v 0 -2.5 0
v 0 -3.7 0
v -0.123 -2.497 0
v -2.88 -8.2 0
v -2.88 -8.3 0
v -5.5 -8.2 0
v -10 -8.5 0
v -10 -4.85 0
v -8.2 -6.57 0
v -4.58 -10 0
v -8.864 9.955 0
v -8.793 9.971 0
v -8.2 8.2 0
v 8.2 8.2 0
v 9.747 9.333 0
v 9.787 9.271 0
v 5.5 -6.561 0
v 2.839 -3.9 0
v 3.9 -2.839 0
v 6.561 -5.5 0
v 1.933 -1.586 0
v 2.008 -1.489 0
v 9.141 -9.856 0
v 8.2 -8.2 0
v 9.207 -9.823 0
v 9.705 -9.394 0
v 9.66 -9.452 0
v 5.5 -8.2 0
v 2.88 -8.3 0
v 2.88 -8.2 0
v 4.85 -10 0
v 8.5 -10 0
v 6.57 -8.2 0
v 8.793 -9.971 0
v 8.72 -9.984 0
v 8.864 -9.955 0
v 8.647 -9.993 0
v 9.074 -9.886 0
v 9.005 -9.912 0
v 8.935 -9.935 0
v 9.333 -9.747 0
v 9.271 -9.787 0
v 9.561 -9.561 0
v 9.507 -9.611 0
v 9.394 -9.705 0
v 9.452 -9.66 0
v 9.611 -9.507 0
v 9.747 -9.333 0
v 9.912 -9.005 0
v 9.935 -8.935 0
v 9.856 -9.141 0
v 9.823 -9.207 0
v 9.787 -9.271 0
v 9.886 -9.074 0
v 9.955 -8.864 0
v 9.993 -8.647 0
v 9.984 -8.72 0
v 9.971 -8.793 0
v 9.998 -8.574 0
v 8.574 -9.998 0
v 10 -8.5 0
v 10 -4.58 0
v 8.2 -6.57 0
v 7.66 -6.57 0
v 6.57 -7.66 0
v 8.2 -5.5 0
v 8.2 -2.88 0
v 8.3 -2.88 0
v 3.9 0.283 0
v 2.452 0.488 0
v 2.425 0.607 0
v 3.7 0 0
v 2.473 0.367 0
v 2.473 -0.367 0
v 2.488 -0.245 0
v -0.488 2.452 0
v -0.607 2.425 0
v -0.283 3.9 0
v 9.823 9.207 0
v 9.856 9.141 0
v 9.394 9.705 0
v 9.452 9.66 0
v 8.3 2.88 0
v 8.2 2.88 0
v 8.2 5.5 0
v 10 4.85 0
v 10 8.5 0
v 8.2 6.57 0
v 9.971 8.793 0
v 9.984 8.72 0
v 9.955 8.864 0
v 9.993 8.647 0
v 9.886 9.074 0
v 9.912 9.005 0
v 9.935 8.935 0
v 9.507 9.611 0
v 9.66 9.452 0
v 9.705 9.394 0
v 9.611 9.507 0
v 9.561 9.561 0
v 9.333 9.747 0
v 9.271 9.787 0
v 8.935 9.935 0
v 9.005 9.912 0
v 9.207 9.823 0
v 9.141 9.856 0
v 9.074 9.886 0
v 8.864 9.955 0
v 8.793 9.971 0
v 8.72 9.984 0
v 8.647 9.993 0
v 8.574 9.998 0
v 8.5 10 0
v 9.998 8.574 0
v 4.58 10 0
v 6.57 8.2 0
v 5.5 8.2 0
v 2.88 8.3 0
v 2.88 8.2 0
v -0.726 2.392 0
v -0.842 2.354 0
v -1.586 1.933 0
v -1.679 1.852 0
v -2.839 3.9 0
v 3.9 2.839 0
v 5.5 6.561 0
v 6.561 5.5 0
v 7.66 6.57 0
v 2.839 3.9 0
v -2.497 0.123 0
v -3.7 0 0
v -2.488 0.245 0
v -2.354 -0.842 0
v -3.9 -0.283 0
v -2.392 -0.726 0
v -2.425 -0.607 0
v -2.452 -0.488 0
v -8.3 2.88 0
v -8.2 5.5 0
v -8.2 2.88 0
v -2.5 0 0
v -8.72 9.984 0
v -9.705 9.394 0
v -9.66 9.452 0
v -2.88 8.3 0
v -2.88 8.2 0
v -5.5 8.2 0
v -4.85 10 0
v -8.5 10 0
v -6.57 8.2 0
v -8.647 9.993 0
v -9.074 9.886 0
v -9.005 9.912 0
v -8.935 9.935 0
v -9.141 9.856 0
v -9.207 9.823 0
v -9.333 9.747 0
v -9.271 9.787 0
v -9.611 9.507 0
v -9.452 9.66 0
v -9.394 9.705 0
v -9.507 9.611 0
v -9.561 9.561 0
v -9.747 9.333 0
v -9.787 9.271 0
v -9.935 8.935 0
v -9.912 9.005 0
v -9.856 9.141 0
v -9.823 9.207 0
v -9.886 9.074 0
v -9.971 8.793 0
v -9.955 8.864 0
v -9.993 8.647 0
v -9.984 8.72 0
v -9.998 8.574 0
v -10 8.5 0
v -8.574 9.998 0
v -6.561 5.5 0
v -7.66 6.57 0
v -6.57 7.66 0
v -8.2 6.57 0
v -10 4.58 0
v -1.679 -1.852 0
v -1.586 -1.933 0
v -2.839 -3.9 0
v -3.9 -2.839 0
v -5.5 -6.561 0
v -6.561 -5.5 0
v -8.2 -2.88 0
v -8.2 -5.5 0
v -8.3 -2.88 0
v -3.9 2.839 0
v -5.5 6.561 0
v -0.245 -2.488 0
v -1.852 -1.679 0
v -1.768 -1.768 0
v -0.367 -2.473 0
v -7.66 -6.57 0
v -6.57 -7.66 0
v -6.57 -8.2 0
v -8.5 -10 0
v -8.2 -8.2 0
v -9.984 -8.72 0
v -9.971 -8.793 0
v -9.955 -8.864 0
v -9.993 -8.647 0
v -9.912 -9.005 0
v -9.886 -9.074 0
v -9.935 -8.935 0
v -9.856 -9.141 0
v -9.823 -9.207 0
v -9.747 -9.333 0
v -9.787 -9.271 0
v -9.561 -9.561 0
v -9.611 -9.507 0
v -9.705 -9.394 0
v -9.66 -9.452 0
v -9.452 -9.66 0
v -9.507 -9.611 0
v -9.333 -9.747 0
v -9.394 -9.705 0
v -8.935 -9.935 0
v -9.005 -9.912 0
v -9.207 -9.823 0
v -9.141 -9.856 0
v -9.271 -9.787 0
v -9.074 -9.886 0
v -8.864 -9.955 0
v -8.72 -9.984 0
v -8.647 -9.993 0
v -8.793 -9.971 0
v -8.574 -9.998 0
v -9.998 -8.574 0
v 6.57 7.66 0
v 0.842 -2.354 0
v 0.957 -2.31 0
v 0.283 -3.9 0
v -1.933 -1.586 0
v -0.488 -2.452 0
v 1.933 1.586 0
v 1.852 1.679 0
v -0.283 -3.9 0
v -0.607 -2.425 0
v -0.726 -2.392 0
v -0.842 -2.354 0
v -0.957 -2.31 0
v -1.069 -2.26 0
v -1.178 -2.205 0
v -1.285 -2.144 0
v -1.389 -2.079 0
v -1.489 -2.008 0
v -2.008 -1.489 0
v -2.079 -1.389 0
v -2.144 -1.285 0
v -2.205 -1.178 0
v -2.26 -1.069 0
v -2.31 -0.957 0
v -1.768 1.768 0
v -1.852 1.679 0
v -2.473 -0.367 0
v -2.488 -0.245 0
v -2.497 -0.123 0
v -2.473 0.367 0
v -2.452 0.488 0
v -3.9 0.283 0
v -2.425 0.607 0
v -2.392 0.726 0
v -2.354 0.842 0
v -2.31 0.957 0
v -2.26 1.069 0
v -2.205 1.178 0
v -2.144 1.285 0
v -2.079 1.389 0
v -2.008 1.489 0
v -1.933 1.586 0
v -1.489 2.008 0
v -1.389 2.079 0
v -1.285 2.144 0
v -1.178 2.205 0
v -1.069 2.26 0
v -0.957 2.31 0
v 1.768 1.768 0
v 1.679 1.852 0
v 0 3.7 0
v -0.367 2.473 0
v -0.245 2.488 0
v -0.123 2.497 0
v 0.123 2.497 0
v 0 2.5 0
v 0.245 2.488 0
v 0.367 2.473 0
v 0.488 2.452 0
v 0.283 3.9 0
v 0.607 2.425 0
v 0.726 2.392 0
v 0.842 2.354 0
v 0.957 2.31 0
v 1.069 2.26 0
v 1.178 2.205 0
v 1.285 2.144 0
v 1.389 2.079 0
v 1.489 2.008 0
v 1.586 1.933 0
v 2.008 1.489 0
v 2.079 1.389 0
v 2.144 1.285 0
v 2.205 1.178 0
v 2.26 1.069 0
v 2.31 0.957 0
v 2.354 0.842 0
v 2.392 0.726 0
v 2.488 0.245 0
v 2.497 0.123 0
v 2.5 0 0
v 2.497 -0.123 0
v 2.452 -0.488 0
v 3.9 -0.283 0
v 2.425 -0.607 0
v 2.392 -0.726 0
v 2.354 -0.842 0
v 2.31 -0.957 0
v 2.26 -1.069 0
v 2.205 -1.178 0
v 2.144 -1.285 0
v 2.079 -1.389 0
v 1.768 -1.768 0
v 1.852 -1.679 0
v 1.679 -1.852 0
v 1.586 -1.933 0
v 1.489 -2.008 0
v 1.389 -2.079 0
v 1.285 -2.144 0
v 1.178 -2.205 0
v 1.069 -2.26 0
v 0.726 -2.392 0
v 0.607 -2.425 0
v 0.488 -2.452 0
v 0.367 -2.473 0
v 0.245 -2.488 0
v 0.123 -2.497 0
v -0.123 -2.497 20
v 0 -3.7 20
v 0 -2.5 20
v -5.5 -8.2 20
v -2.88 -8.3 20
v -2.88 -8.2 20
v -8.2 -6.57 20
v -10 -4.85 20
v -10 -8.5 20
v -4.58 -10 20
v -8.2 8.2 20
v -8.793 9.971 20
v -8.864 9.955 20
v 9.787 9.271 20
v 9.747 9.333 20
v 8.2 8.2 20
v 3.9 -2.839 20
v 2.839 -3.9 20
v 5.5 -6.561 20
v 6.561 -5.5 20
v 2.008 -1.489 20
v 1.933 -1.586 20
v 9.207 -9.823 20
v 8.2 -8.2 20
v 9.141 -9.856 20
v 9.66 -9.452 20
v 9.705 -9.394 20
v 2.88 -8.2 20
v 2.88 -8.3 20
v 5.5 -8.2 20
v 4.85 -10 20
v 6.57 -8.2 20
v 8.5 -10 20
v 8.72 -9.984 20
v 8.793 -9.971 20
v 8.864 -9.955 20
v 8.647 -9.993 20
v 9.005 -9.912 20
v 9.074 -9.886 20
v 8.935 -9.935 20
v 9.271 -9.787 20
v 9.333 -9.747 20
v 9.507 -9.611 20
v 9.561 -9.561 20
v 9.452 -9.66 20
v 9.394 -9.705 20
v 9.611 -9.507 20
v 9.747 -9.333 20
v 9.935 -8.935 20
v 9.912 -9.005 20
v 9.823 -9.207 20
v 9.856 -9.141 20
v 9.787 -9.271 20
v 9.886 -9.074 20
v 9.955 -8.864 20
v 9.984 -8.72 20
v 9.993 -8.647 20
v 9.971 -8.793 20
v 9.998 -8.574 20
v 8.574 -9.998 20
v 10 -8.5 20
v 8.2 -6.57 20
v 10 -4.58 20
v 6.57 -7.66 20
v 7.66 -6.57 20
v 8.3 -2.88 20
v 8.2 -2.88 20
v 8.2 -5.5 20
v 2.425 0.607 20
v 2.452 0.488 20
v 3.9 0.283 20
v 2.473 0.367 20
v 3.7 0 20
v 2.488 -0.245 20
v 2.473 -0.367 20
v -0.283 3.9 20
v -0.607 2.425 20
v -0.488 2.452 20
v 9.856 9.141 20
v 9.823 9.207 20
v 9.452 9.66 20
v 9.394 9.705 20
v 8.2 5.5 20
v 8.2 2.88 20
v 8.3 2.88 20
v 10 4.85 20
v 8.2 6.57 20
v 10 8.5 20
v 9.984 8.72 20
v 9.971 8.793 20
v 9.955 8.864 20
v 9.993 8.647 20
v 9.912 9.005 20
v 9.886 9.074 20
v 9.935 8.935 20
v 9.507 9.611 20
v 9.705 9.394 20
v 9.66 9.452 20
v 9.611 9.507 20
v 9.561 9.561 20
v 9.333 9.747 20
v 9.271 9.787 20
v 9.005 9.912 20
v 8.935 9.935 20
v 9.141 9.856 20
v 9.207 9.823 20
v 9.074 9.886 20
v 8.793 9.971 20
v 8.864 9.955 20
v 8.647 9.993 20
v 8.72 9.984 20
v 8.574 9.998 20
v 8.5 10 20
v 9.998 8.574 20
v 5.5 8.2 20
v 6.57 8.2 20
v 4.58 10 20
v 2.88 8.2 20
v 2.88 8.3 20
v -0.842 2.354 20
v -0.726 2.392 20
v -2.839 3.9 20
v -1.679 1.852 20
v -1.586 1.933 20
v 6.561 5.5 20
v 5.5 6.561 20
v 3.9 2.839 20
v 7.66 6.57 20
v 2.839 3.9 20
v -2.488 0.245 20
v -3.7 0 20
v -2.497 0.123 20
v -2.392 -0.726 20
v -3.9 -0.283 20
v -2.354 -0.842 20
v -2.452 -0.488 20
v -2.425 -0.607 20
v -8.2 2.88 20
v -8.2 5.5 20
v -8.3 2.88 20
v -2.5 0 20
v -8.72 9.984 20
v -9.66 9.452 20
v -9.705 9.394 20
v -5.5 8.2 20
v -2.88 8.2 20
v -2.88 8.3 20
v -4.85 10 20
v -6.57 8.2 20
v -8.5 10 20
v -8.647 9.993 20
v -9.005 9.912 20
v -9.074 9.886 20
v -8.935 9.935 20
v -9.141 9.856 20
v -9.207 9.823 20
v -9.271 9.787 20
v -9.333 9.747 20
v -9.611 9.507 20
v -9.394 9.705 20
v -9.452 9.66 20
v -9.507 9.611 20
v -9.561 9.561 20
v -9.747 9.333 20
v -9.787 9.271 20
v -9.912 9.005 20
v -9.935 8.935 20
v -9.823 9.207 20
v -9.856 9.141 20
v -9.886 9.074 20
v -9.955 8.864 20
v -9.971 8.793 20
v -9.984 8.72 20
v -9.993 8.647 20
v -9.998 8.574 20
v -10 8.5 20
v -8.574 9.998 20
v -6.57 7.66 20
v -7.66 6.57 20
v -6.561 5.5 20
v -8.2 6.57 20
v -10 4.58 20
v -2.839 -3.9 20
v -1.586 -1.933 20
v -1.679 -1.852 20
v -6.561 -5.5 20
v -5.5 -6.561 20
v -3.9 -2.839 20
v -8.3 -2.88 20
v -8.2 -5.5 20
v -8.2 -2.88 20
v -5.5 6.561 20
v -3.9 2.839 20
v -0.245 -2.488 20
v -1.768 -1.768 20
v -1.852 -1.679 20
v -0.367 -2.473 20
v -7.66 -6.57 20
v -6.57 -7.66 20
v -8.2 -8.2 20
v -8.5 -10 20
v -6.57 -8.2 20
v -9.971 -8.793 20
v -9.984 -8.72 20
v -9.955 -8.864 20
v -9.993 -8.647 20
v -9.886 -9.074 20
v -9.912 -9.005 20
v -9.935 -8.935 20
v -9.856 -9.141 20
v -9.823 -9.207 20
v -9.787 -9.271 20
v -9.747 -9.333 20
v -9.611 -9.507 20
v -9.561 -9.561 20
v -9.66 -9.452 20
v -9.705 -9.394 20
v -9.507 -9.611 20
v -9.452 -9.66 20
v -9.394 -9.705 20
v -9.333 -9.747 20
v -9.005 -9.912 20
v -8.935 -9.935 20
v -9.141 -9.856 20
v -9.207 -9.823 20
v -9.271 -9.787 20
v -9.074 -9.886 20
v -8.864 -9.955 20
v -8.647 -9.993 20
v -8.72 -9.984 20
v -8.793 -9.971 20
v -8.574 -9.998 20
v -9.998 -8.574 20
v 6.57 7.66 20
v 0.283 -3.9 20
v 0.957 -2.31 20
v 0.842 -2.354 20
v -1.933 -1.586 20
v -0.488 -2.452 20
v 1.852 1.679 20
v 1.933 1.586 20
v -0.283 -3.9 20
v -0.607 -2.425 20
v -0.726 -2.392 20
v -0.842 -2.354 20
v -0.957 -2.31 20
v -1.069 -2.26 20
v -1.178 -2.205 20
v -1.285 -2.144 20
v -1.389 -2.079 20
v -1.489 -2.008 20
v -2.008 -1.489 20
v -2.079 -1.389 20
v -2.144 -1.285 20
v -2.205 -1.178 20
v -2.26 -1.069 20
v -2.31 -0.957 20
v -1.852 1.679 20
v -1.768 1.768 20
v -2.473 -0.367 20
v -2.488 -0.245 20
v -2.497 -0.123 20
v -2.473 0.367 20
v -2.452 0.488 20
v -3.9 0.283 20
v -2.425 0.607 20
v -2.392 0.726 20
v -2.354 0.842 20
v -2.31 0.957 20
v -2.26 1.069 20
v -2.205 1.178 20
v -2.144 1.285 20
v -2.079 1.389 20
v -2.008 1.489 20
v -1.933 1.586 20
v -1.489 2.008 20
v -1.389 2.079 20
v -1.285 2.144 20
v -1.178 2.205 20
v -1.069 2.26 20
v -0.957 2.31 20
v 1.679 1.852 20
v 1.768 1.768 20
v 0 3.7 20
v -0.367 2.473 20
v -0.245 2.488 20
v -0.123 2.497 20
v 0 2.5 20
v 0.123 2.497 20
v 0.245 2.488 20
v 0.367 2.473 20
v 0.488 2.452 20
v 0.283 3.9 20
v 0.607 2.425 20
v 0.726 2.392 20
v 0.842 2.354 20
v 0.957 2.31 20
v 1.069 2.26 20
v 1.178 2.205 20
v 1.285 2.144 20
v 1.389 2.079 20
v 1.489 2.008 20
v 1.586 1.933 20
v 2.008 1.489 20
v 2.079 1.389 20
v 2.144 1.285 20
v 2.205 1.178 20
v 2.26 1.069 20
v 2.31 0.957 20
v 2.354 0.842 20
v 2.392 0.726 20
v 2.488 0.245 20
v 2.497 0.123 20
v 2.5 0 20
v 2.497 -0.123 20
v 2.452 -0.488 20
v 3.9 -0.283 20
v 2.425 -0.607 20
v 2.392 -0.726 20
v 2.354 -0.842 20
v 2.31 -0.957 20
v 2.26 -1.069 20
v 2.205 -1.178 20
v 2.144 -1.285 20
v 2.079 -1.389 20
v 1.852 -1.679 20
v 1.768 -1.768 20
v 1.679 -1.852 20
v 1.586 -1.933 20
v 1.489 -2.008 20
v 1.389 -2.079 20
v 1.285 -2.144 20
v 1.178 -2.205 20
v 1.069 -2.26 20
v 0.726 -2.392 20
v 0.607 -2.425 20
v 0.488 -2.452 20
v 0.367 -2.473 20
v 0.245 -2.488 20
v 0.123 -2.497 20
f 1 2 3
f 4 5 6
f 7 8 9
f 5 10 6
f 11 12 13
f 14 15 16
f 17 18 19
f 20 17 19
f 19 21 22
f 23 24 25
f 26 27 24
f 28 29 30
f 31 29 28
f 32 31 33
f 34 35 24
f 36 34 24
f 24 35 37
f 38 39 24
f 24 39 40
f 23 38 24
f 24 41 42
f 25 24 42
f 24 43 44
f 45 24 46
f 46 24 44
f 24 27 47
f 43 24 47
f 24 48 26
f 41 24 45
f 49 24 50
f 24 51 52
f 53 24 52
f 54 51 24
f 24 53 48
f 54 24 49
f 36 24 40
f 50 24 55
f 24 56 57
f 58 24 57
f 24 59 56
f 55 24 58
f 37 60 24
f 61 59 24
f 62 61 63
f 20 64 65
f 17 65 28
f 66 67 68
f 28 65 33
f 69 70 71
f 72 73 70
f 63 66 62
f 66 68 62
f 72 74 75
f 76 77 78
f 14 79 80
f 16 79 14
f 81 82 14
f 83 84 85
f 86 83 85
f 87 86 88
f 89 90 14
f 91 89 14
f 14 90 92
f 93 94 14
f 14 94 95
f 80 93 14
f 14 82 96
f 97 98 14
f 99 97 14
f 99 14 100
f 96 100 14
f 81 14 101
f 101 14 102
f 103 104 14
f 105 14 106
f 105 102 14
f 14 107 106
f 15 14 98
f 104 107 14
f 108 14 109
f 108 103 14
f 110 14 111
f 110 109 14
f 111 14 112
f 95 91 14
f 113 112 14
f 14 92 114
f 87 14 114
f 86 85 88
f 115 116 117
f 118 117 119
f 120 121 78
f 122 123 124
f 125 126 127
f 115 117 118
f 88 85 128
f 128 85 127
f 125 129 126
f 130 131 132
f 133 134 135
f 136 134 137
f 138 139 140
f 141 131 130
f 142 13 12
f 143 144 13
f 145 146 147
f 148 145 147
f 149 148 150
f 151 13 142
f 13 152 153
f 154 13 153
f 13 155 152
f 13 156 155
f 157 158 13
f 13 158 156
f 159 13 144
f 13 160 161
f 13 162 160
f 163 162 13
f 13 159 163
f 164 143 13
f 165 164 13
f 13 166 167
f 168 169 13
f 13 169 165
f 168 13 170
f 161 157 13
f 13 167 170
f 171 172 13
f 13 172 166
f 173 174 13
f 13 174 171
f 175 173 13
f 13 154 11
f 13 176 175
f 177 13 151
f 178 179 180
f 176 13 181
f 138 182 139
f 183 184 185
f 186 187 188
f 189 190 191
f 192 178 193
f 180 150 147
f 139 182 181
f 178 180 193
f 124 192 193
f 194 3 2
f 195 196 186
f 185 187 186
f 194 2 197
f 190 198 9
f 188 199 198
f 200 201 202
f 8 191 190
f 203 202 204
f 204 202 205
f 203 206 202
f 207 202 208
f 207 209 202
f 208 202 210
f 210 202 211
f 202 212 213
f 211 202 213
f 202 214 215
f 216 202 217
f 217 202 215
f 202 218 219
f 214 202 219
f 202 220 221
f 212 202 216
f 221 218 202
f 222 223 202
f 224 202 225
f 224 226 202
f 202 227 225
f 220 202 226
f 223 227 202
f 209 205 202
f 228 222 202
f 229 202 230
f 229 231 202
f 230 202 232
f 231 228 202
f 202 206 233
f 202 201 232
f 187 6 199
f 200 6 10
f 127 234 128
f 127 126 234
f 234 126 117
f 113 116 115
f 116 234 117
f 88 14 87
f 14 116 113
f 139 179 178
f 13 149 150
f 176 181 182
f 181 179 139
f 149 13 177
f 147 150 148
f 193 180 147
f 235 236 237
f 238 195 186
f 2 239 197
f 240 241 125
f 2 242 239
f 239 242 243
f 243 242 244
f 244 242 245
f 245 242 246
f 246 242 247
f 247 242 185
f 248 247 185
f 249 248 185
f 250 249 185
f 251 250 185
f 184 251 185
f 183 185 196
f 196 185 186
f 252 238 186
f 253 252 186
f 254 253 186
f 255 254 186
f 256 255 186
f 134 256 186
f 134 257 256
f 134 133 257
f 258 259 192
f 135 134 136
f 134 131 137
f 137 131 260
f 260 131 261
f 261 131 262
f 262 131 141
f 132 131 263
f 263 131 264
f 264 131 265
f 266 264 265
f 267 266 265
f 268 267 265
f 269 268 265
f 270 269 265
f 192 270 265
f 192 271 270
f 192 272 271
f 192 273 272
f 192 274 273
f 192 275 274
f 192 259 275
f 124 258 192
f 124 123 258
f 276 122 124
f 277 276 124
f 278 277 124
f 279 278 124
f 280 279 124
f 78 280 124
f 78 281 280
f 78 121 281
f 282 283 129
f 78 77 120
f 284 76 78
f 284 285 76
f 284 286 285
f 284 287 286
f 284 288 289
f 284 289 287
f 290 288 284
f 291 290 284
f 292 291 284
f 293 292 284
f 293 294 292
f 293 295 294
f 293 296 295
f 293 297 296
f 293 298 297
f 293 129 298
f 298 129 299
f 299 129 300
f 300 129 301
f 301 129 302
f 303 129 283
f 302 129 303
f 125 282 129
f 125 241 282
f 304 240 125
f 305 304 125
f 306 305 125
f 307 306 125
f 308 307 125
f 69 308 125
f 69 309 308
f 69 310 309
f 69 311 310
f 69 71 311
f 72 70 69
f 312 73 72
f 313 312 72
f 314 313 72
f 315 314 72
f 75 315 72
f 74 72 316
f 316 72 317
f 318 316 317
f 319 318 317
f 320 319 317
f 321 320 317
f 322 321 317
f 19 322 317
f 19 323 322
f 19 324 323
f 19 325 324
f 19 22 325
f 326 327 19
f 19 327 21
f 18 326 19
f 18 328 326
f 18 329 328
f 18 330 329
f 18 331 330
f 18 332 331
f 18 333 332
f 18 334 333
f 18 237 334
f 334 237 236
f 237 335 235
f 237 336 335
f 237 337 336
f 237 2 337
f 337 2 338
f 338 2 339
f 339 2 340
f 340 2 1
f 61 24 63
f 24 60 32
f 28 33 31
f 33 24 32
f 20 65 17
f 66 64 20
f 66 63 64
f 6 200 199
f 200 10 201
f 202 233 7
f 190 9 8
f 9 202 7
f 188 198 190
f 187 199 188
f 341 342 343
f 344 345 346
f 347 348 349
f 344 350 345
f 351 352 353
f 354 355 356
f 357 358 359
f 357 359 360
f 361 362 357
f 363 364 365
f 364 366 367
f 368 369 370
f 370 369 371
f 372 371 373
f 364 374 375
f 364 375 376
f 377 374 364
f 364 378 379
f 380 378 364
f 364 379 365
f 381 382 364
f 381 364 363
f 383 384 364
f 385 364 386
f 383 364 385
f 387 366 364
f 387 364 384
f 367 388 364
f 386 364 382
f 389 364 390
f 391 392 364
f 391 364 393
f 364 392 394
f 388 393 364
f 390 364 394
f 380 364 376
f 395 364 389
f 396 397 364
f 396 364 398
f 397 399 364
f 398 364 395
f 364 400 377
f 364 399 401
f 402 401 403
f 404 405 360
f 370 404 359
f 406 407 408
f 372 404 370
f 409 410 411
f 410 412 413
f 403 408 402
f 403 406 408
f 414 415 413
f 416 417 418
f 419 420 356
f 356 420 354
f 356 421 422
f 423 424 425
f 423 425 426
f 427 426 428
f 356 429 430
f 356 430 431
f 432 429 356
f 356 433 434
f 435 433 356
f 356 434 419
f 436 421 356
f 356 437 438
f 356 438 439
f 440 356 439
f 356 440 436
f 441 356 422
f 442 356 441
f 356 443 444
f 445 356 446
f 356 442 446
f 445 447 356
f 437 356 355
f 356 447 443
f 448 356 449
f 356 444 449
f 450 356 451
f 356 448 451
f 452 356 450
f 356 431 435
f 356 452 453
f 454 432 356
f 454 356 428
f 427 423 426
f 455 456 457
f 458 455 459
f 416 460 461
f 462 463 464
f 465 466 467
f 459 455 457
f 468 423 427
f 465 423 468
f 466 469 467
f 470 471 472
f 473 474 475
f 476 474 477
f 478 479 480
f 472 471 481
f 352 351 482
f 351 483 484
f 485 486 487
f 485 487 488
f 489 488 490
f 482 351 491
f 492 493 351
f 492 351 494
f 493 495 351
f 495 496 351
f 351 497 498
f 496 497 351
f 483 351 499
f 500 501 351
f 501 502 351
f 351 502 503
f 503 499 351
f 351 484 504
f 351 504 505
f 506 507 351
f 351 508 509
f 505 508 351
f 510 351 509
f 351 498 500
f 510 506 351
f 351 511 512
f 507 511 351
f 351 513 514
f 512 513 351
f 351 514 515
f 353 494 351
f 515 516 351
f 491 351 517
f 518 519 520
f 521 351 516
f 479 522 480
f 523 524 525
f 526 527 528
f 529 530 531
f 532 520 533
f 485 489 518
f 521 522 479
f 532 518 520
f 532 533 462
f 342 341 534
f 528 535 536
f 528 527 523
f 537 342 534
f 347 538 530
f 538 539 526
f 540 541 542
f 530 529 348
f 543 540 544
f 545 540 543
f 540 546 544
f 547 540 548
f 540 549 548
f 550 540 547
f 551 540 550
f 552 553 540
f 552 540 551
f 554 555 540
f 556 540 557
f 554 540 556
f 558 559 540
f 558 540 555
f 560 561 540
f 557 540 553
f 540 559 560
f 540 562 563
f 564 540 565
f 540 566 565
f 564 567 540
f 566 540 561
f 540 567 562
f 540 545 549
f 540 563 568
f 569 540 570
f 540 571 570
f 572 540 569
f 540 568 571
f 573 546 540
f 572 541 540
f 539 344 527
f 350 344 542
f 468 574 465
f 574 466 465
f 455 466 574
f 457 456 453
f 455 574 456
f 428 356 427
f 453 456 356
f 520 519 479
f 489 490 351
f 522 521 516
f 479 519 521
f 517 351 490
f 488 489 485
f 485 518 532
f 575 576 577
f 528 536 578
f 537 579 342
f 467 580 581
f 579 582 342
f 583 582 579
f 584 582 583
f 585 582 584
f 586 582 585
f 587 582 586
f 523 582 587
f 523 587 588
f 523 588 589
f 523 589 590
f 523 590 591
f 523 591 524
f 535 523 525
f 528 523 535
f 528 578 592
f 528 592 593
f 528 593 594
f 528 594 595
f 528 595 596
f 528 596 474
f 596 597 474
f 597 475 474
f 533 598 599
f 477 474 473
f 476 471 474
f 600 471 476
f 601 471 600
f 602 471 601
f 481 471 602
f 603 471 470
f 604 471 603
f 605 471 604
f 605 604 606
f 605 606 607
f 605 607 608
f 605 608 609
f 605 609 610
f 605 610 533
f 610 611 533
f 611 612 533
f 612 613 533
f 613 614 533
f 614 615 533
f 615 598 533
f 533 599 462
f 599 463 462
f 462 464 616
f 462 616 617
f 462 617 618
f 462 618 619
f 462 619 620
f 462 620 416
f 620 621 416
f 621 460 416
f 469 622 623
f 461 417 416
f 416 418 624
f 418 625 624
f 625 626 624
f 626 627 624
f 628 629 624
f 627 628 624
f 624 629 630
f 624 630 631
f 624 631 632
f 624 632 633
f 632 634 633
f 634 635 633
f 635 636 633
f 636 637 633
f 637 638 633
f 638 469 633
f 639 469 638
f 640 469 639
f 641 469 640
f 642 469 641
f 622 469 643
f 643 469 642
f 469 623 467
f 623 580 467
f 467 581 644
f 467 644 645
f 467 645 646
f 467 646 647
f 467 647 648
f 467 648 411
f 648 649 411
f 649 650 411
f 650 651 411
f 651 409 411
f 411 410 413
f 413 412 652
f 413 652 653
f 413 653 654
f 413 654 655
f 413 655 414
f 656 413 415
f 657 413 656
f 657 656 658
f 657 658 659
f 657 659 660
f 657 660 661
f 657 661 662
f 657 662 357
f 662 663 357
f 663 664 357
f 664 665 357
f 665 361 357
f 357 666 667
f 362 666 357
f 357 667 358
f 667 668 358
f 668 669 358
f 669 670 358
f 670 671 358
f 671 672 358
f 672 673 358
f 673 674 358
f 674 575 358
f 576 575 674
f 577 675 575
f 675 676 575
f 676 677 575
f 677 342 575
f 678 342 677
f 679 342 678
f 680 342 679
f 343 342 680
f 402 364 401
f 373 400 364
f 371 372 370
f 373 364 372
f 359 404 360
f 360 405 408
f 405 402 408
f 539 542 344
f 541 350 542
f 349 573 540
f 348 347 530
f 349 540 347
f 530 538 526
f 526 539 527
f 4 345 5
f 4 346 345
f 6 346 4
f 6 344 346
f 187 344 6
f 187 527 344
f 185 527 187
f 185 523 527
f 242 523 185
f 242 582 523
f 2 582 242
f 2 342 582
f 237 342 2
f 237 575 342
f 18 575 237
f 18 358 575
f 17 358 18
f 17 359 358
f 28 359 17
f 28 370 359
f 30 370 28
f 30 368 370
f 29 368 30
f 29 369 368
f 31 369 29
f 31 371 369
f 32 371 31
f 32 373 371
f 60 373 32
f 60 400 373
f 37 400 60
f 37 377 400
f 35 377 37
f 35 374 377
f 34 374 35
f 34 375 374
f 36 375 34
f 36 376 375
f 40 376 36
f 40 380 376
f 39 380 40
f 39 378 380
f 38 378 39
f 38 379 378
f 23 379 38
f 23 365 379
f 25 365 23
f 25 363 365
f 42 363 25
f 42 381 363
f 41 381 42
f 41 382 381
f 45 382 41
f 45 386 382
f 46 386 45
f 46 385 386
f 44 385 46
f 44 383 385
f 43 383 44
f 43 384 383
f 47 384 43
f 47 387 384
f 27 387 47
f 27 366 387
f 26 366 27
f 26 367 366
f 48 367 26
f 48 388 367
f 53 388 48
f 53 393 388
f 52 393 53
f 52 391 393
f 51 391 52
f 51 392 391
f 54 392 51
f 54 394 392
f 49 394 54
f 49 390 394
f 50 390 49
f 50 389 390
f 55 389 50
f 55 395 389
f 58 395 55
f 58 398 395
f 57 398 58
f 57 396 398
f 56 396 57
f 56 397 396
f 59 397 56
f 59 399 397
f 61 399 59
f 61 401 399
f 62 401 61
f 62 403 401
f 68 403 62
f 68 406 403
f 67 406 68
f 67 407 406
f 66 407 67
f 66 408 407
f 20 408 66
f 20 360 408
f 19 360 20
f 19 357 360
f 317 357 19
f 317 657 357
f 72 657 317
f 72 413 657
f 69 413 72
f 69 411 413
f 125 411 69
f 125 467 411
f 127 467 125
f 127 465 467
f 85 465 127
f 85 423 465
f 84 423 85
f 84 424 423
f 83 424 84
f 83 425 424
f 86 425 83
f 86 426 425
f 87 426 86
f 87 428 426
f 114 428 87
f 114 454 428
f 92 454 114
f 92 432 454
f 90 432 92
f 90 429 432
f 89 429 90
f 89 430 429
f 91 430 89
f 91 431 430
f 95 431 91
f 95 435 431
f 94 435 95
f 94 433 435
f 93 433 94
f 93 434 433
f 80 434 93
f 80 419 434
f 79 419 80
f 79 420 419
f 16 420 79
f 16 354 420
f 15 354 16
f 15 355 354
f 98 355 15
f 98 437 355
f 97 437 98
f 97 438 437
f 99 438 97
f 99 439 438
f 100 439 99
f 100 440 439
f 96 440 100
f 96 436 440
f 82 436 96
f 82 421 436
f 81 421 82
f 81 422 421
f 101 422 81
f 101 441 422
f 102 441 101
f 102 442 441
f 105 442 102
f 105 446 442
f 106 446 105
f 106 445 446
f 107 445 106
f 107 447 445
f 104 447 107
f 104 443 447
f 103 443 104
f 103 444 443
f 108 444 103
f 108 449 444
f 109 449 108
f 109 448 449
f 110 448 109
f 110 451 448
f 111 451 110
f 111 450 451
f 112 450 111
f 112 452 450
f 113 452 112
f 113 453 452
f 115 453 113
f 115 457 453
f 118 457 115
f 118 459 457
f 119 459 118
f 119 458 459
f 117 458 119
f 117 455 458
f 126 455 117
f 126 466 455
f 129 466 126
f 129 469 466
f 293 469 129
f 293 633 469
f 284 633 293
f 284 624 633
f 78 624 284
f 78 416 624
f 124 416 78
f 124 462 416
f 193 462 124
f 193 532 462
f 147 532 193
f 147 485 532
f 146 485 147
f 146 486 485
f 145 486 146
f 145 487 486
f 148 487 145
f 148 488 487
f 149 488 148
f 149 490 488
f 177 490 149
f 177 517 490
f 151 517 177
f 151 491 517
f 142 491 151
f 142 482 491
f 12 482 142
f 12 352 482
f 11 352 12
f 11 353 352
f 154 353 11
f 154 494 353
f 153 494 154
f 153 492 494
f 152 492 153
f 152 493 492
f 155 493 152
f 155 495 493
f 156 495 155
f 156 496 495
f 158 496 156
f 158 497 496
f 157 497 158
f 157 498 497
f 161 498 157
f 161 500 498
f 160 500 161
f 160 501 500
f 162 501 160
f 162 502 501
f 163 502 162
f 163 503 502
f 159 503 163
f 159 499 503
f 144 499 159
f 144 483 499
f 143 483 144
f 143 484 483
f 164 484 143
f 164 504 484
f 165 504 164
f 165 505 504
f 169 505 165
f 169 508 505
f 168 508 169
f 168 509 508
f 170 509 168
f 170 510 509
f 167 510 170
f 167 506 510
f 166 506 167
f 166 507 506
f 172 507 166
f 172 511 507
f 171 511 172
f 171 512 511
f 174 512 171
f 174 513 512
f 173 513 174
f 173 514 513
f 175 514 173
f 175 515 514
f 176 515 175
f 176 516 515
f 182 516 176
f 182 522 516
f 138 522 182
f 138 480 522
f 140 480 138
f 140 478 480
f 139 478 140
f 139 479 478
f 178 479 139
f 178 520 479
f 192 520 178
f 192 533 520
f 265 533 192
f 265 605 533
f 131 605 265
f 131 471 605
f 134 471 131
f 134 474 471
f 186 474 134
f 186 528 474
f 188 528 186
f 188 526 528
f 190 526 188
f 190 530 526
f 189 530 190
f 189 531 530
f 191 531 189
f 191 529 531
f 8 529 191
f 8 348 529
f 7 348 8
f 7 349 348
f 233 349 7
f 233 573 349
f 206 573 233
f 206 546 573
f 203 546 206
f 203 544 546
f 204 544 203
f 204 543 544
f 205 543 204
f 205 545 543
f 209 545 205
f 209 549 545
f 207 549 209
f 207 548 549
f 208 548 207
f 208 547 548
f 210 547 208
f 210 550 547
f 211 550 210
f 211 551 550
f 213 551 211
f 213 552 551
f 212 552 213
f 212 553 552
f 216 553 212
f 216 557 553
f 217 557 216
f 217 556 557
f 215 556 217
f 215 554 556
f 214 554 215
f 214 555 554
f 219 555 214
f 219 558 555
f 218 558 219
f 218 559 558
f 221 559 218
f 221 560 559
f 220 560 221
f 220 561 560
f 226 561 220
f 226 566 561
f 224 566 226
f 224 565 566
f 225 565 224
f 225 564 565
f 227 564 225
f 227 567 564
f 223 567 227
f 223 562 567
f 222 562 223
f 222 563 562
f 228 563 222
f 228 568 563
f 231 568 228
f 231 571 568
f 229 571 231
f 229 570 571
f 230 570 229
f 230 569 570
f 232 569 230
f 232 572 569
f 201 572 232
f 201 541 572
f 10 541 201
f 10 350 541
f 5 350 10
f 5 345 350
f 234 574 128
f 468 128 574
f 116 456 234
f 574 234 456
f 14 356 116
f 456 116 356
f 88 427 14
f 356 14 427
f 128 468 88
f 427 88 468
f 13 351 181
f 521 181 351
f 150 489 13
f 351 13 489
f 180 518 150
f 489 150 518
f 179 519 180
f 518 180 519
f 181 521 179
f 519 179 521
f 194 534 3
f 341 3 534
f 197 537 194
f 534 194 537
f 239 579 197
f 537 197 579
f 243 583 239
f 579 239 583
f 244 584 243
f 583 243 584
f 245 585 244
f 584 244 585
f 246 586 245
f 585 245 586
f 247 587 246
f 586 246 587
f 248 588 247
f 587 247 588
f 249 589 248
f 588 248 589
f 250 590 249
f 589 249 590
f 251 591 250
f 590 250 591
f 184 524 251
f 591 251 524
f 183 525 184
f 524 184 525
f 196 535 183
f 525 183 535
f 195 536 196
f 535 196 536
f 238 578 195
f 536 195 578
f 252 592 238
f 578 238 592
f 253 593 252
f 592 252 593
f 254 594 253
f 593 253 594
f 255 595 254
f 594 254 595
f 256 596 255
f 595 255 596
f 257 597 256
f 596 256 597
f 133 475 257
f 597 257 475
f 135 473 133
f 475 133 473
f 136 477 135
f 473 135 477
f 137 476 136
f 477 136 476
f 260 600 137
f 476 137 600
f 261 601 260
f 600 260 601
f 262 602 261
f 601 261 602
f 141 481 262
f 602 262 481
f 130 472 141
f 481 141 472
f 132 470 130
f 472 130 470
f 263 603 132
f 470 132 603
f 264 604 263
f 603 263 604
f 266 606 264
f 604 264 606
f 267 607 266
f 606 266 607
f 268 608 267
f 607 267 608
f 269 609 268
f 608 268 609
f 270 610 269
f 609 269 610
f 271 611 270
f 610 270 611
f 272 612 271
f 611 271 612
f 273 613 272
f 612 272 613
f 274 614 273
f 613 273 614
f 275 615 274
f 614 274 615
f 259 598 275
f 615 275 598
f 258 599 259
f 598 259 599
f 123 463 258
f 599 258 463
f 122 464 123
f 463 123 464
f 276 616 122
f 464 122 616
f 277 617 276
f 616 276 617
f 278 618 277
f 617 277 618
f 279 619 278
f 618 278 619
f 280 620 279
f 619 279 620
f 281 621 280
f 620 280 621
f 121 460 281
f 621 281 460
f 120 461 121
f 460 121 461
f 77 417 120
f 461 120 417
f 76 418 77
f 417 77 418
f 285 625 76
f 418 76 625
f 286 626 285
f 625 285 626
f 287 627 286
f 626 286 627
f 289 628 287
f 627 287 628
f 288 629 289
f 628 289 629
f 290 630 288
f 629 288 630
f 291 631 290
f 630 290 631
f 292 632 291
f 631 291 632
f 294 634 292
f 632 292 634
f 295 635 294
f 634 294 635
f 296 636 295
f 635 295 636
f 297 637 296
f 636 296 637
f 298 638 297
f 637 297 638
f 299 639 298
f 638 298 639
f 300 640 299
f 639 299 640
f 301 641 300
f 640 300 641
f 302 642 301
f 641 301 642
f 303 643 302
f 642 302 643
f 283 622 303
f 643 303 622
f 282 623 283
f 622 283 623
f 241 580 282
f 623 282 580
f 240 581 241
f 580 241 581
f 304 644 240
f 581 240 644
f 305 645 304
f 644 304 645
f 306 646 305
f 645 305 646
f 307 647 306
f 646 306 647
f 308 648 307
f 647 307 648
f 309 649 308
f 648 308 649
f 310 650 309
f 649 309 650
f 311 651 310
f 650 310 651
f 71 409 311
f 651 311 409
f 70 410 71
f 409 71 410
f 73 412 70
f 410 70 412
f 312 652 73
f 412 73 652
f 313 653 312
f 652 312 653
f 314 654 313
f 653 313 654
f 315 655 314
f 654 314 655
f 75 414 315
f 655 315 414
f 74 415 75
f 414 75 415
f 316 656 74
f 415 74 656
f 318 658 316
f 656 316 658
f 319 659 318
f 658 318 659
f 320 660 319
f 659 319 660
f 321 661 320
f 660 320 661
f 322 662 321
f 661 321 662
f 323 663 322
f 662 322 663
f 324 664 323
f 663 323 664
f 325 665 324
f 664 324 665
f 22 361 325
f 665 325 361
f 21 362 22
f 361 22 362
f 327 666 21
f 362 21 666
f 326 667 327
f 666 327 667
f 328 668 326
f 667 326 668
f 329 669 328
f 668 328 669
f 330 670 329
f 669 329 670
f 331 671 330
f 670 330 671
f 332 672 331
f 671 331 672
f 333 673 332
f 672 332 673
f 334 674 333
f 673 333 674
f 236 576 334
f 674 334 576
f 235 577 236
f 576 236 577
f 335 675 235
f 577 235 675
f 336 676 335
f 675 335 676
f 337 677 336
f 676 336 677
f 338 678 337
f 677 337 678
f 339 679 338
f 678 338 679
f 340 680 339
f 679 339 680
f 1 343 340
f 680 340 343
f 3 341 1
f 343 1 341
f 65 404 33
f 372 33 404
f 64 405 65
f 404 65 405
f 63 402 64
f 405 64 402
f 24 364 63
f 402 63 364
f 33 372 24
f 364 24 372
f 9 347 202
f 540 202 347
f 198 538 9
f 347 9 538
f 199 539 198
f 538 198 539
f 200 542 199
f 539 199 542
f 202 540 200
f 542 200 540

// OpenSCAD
part = "20x Extrusion"; //[20x Extrusion, 40x40 Extrusion, Wheel, OpenRail, 20mm Gantry Plate, Universal Gantry Plate, OpenRail Gantry Plate, 20x End Cap, T-Nut, Flat Linker, Angled Linker]

type = "20mm"; //[20mm, 40mm, 60mm, 80mm]

scale_factor = 1; //[1:Full, 0.5:Half, 0.25:Quarter]

length = 20; //[10:1:100]

sections = 2; //[2:1:24]

angle = 90; //[10:1:180]

hole_offset = 0; //[0:1:100]

/*[Hidden]*/
$fn=128;
delta=0.01;
tolerance = 0.2;

//radius to edge
function apothem(s=20, n) = s/(2*tan(180/n));
//radius to corner
function circumradius(s=20, n) = s/(2*sin(180/n));
//polar to cartesian
function p2c_x(r,a) = r*cos(a);
function p2c_y(r,a) = r*sin(a);

module oval_hole(length, diameter, height){
    translate([-length/2,-diameter/2,0])
    cube([length,diameter,height]);

    translate([length/2,0,0])
    cylinder(h=height, d=diameter);

    translate([-length/2,0,0])
    cylinder(h=height, d=diameter);
}

//Basic outline of one quarter of extrusion
module vslot_unit(){
    difference(){
        union(){
            polygon(points=[[0,0],[0,3.7],[0.2*sqrt(2),3.9],[3.9-1.5*sqrt(0.5),3.9],[5.5,5.5+1.5*sqrt(0.5)],[5.5,8.2],[2.88,8.2],[2.88,8.3],[4.58,10],[8.5,10],[8.5,8.5],[10,8.5],[10,4.85],[8.3,2.88],[8.2,2.88],[8.2,5.5],[5.5+1.5*sqrt(0.5),5.5],[3.9,3.9-1.5*sqrt(0.5)],[3.9,0.2*sqrt(2)],[3.7,0]]);

            translate([8.5,8.5,0])
            circle(d=3);
        }

        union(){
            circle(d=5);

            polygon(points=[[6.57,8.2],[8.2,8.2],[8.2,6.57],[7.66,6.57],[6.57,7.66]]);
        }
    }
}

module vslot_corner(){
    difference(){
        union(){
            polygon(points=[[0,0],[0,3.7],[0.2*sqrt(2),3.9],[2.4,3.9],[3.9,2.4],[3.9,0.2*sqrt(2)],[3.7,0]]);

            translate([2.4,2.4,0])
            circle(d=3);
        }

        circle(d=5);
    }
}

//Basic outline used in the middle of anything larger than 20x20
module vslot_extension_unit(){
    difference(){
        union(){
            polygon(points=[[0,0],[0,3.7],[0.2*sqrt(2),3.9],[3.9-1.5*sqrt(0.5),3.9],[5.5,5.5+1.5*sqrt(0.5)],[5.5,8.2],[2.78,8.2],[4.58,10],[10,10],[10,8.2],[7.3,8.2],[7.3,7.3-1.5*sqrt(0.5)],[3.9,3.9-1.5*sqrt(0.5)],[3.9,0.2*sqrt(2)],[3.7,0]]);
        }

        union(){
            circle(d=5);
        }
    }
}

//Pieces together the extention units
module vslot_extension_part(){
    translate([-20,0,0])
    vslot_extension_unit();

    translate([-20,0,0])
    mirror([0,1,0])
    vslot_extension_unit();

    rotate([0,0,180])
    vslot_extension_unit();

    mirror([0,1,0])
    rotate([0,0,180])
    vslot_extension_unit();
}

//Pieces together the extrusion
module extrusion(sections, offset_r){
    linear_extrude(height=length)
    offset(r=offset_r)
    union(){
        for(i=[0:1])
            rotate([0,0,-i*90])
            vslot_unit();

        translate([-20*(sections),0,0])
        for(i=[2:3])
            rotate([0,0,-i*90])
            vslot_unit();

        if(type != "20mm")
            for(i=[0:sections-1])
                translate([-20*i,0,0])
                vslot_extension_part();
    }
}

module 40x40(){
    linear_extrude(height=length)
    union(){
        for(i=[0:3])
        rotate([0,0,i*90])
        translate([10,10,0])
        union(){
            vslot_unit();

            rotate([0,0,-90])
            vslot_extension_unit();

            rotate([0,180,0])
            vslot_extension_unit();

            rotate([0,0,180])
            vslot_corner();
        }
    }
}

module wheel(){
    rotate_extrude()
    //Wheel cross section
    polygon(points=[[6.94717,-0.5],[7.98715,-0.5],[7.98715,-4.816523],[8.28715,-5.116523],[9.774828,-5.116523],[11.945,-2.946351],[11.945,-2.44542],[10.049828,-0.275],[9.374828,-0.275],[9.374828,0.275],[10.049828,0.275],[11.945,2.44542],[11.945,2.946351],[9.774828,5.116523],[8.28715,5.116523],[7.98715,4.816523],[7.98715,0.5],[6.94717,0.5]]);
}

module openrail(){
    difference(){
        linear_extrude(height=length)
        union(){
            //OpenRail cross section
            polygon(points=[[0,0.3],[0.3,0.3],[0.3,0],[2.075,0],[2.075,0.3],[2.375,0.3],[2.375,19.529],[4.75,19.529],[4.75,20.329],[2.375+0.5*sqrt(0.5),22.704-0.5*sqrt(0.5)],[2.375,22.704-0.5*sqrt(2)],[2.375-0.5*sqrt(0.5),22.704-0.5*sqrt(0.5)],[0,20.329]]);

            translate([0.3,0.3,0])
            circle(d=0.6);

            translate([2.075,0.3,0])
            circle(d=0.6);

            translate([2.375,22.704-0.5*sqrt(2),0])
            circle(d=1);
        }

        for(i=[0:floor(length/50)])
            translate([-delta,9.7543,50*(i+0.5)])
            rotate([0,90,0])
            rotate([0,0,-90])
            oval_hole(length=6.7, diameter=5.3, height=2.375+2*delta);
    }
}

plate_spec = [
["width","Depth","Thickness","Corner Radius",
    ["Hole Diameter","Hole Length (0 for circle)","X translation","Y translation"]
],

//20mm Gantry Plate
[65.5,65.5,3,3.36,
    [3,6.5,-20.146,27.7],[3,6.5,0,27.7],[3,6.5,20.146,27.7],
    [5,0,-19.85,20],[5,20.64,0,20],[7.2,0,19.85,20],
    [5,0,-19.85,10],[5,0,0,10],[5,0,19.85,10],
    [5,0,-19.85,0],[5,0,-10,0],[5,0,0,0],[5,0,10,0],[7.2,0,19.85,0],
    [5,0,-19.85,-10],[5,0,0,-10],[5,0,19.85,-10],
    [5,0,-19.85,-20],[5,20.64,0,-20],[7.2,0,19.85,-20],
    [3,6.5,-20.146,-27.7],[3,6.5,0,-27.7],[3,6.5,20.146,-27.7]
],

//Universal Gantry Plate
[127,88,3,3.36,
    [3,6.5,-20,38.02],[3,6.5,0,38.02],[3,6.5,20,38.02],
    [5,0,-49.85,30.32],[5,0,-39.85,30.32],[5,0,-29.85,30.32],[5,0,-19.85,30.32],[5,20,0,30.32],[7.2,0,19.85,30.32],[7.2,0,29.85,30.32],[7.2,0,39.85,30.32],[7.2,0,49.85,30.32],
    [5,0,-49.85,20.325],[5,0,-39.85,20.325],[5,0,-29.85,20.325],[5,0,-19.85,20.325],[5,0,-10,20.325],[5,0,0,20.325],[5,0,10,20.325],[5,0,19.85,20.325],[5,0,29.85,20.325],[5,0,39.85,20.325],[5,0,49.85,20.325],
    [5,0,-14.825,14.82],[5,0,14.825,14.82],
    [5,0,-29.85,10],[5,0,-19.85,10],[5,0,0,10],[5,0,19.85,10],[5,0,29.85,10],
    [5,0,-49.85,0],[5,0,-39.85,0],[5,0,-29.85,0],[5,0,-19.85,0],[5,0,-10,0],[5,0,0,0],[5,0,10,0],[7.2,0,19.85,0],[7.2,0,29.85,0],[7.2,0,39.85,0],[7.2,0,49.85,0],
    [5,0,-29.85,-10],[5,0,-19.85,-10],[5,0,0,-10],[5,0,19.85,-10],[5,0,29.85,-10],
    [5,0,-14.825,-14.82],[5,0,14.825,-14.82],
    [5,0,-49.85,-20.325],[5,0,-39.85,-20.325],[5,0,-29.85,-20.325],[5,0,-19.85,-20.325],[5,0,-10,-20.325],[5,0,0,-20.325],[5,0,10,-20.325],[5,0,19.85,-20.325],[5,0,29.85,-20.325],[5,0,39.85,-20.325],[5,0,49.85,-20.325],
    [5,0,-49.85,-30.32],[5,0,-39.85,-30.32],[5,0,-29.85,-30.32],[5,0,-19.85,-30.32],[5,20,0,-30.32],[7.2,0,19.85,-30.32],[7.2,0,29.85,-30.32],[7.2,0,39.85,-30.32],[7.2,0,49.85,-30.32],
    [3,6.5,-20,-38.02],[3,6.5,0,-38.02],[3,6.5,20,-38.02]
],

//OpenRail 20mm Gantry Plate
[80,80,3.175,10,
    [5,0,-22.3,22.3],[5,0,0,22.3],[7.137,0,22.3,22.3],
    [5,0,0,22.30],
    [5,0,0,10],
    [5,0,-22.3,0],[5,0,-10,0],[5,0,0,0],[5,0,10,0],[7.137,0,22.3,0],
    [5,0,0,-10],
    [5,0,-22.3,-22.3],[5,0,0,-22.3],[7.137,0,22.3,-22.3]
],

//OpenRail 40mm Gantry Plate
[100,120,3.175,10,
    [5,0,-32.3,42.3],[5,0,-22.3,42.3],[5,0,-10,42.3],[5,0,0,42.3],[5,0,10,42.3],[7.137,0,22.3,42.3],[7.137,0,32.3,42.3],
    [5,0,-10,30],[5,0,10,30],
    [5,0,-10,20],[5,0,10,20],
    [5,0,-40,10],[5,0,-20,10],[5,0,0,10],[5,0,20,10],[5,0,40,10],
    [5,0,-32.3,0],[5,0,-10,0],[5,0,0,0],[5,0,10,0],[7.137,0,32.3,0],
    [5,0,-40,-10],[5,0,-20,-10],[5,0,0,-10],[5,0,20,-10],[5,0,40,-10],
    [5,0,-10,-20],[5,0,10,-20],
    [5,0,-10,-30],[5,0,10,-30],
    [5,0,-32.3,-42.3],[5,0,-22.3,-42.3],[5,0,-10,-42.3],[5,0,0,-42.3],[5,0,10,-42.3],[7.137,0,22.3,-42.3],[7.137,0,32.3,-42.3]
],

//OpenRail 60mm Gantry Plate
[120,140,3.175,10,
    [5,0,-42.3,52.3],[5,0,-32.3,52.3],[5,0,-22.3,52.3],[5,0,-10,52.3],[5,0,0,52.3],[5,0,10,52.3],[7.137,0,22.3,52.3],[7.137,0,32.3,52.3],[7.137,0,42.3,52.3],
    [5,0,-20,30],[5,0,0,30],[5,0,20,30],
    [5,0,-42.3,26.3],[7.137,0,42.3,26.3],
    [5,0,-30,20],[5,0,0,20],[5,0,30,20],
    [5,0,-45,10],[5,0,0,10],[5,0,45,10],
    [5,0,-42.30,0],[5,0,-30,0],[5,0,-20,0],[5,0,-10,0],[5,0,0,0],[5,0,10,0],[5,0,20,0],[5,0,30,0],[7.137,0,42.30,0],
    [5,0,-45,-10],[5,0,0,-10],[5,0,45,-10],
    [5,0,-30,-20],[5,0,0,-20],[5,0,30,-20],
    [5,0,-42.3,-26.3],[7.137,0,42.3,-26.3],
    [5,0,-20,-30],[5,0,0,-30],[5,0,20,-30],
    [5,0,-42.3,-52.3],[5,0,-32.3,-52.3],[5,0,-22.3,-52.3],[5,0,-10,-52.3],[5,0,0,-52.3],[5,0,10,-52.3],[7.137,0,22.3,-52.3],[7.137,0,32.3,-52.3],[7.137,0,42.3,-52.3]
],

//OpenRail 80mm Gantry Plate
[140,160,3.175,10,
    [5,0,-52.3,62.3],[5,0,-42.3,62.3],[5,0,-32.3,62.3],[5,0,-22.3,62.3],[5,0,-10,62.3],[5,0,0,62.3],[5,0,10,62.3],[7.137,0,22.3,62.3],[7.137,0,32.3,62.3],[7.137,0,42.3,62.3],[7.137,0,52.3,62.3],
    [5,0,-30,40],[5,0,-20,40],[5,0,20,40],[5,0,30,40],
    [5,0,-52.3,35],[7.137,0,52.3,35],
    [5,0,-40,30],[5,0,0,30],[5,0,40,30],
    [5,0,-55,10],[5,0,-40,10],[5,0,0,10],[5,0,40,10],[5,0,55,10],
    [5,0,-52.3,0],[5,0,-30,0],[5,0,-10,0],[5,0,0,0],[5,0,10,0],[5,0,30,0],[5,0,52.3,0],
    [5,0,-55,-10],[5,0,-40,-10],[5,0,0,-10],[5,0,40,-10],[5,0,55,-10],
    [5,0,-40,-30],[5,0,0,-30],[5,0,40,-30],
    [5,0,-52.3,-35],[7.137,0,52.3,-35],
    [5,0,-30,-40],[5,0,-20,-40],[5,0,20,-40],[5,0,30,-40],
    [5,0,-52.3,-62.3],[5,0,-42.3,-62.3],[5,0,-32.3,-62.3],[5,0,-22.3,-62.3],[5,0,-10,-62.3],[5,0,0,-62.3],[5,0,10,-62.3],[7.137,0,22.3,-62.3],[7.137,0,32.3,-62.3],[7.137,0,42.3,-62.3],[7.137,0,52.3,-62.3]
]
];

module plate (plate_type){
    difference(){
        //The plate
        translate([-(plate_spec[plate_type][0]-plate_spec[plate_type][3])/2,-(plate_spec[plate_type][1]-plate_spec[plate_type][3])/2,0])
        minkowski(){
            cube([plate_spec[plate_type][0]-plate_spec[plate_type][3],plate_spec[plate_type][1]-plate_spec[plate_type][3],plate_spec[plate_type][2]/2]);
            cylinder(h=plate_spec[plate_type][2]/2, d=plate_spec[plate_type][3]);
        }

        //The holes
        for (i=[4:len(plate_spec[plate_type])-1]){
            translate([plate_spec[plate_type][i][2],plate_spec[plate_type][i][3],-delta])
            oval_hole(height=plate_spec[plate_type][2]+2*delta,diameter=plate_spec[plate_type][i][0],length=plate_spec[plate_type][i][1]);
        }
    }
}

module end_cap(sections, offset_r){
    difference(){
        translate([-8.5-20*sections,-8.5,-2])
        minkowski(){
            cube([17+20*sections,17,6]);
            cylinder(h=6, d=3);
        }

        union(){
            extrusion(sections, offset_r);

            for(i=[-1:2:1])
                translate([8.2,8.2*i,0])
                cylinder(h=15, d=3.4);

            for(i=[-1:2:1])
                translate([-8.2-20*sections,8.2*i,0])
                cylinder(h=15, d=3.4);
        }
    }
}

module t_nut(){
    difference(){
        linear_extrude(height=length)
        //2.5*tolerance allows T-Nut to move freely, reduce ratio for tighter fit
        offset(r=-2.5*tolerance)
        polygon(points=[[3.9-1.5*sqrt(0.5),3.9],[5.5,5.5+1.5*sqrt(0.5)],[5.5,8.2],[-5.5,8.2],[-5.5,5.5+1.5*sqrt(0.5)],[-3.9+1.5*sqrt(0.5),3.9]]);

        translate([0,3.9+tolerance-delta,length/2])
        rotate([0,30,0])
        rotate([-90,0,0])
        union(){
            // h = depth of nut hole
            // (d*sqrt(3)/2 = nut size, flat-to-flat
            cylinder(h=2.5, d=(2*5.5)/sqrt(3), $fn=6);

            // d = diameter of hole for bolt thread
            cylinder(h=4.3-2*tolerance+2*delta, d=2.5);
        }
    }
}

module linker_blank(){
    translate([0,0,-3.9-2.5*tolerance])
    rotate([90,0,0])
    difference(){
        linear_extrude(height=length)
        //2.5*tolerance allows T-Nut to move freely, reduce ratio for tighter fit
        offset(r=-2.5*tolerance)
        polygon(points=[[3.9-1.5*sqrt(0.5),3.9],[5.5,5.5+1.5*sqrt(0.5)],[5.5,8.2],[-5.5,8.2],[-5.5,5.5+1.5*sqrt(0.5)],[-3.9+1.5*sqrt(0.5),3.9]]);

        for(i=[-floor(length/20):2:floor(length/20)])
        translate([0,3.9+tolerance-delta,5*i+length/2])
        rotate([0,30,0])
        rotate([-90,0,0])
        union(){
            // h = depth of nut hole
            // (d*sqrt(3)/2 = nut size, flat-to-flat
            cylinder(h=2.5, d=(2*5.5)/sqrt(3), $fn=6);

            // d = diameter of hole for bolt thread
            cylinder(h=4.3-2*tolerance+2*delta, d=2.5);
        }
    }
}

module flat_linker(){
    //total angle
    a=(sections-1)*angle;
    //interior of half triangle
    b=90-a/2;
    //y from origin
    B=apothem(s=20,n=360/angle);
    //x from origin
    A=(B*sin(a/2))/sin(b);
    //cord
    cord=2*circumradius(s=20,n=360/angle);

    difference(){
        union(){
            for(i=[0:sections-1])
            rotate([0,0,i*angle])
            translate([0,-apothem(n=360/angle),0])
            linker_blank();

            rotate(-angle/2)
            linear_extrude(height=4.3-(5*tolerance))
            rotate([180,0,0])
            polygon(points=
            [for (i = [0 : sections])
            [circumradius(n=360/angle)*sin(i*angle),
            circumradius(n=360/angle)*cos(i*angle)]
            ]);

            intersection(){
                translate([A,-apothem(s=20,n=360/angle),0])
                cylinder(r=A+10, h=4.3-(5*tolerance));

                translate([-10,-B,0])
                rotate(a/2)
                cube([cord,cord,4.3-(5*tolerance)]);
            }
        }
        union(){
            rotate([0,0,a/2-90])
            translate([hole_offset,0,-delta])
            cylinder(d=2.5, h=4.3-(5*tolerance)+2*delta);
        }
    }
}

module angled_linker(){
    translate([0,0,-4.3+(5*tolerance)+2*delta])
    linker_blank();

    rotate([180-angle,0,0])
    translate([0,length,-4.3+(5*tolerance)+2*delta])
    linker_blank();

    translate([-5.5+(2.5*tolerance),0,0])
    rotate([0,90,0])
    rotate_extrude(angle=180-angle)
    translate([8.6-(4.5*tolerance),5.5-(2.5*tolerance),0])
    rotate([0,0,90])
    offset(r=-2.5*tolerance)
    polygon(points=[[3.9-1.5*sqrt(0.5),3.9],[5.5,5.5+1.5*sqrt(0.5)],[5.5,8.2],[-5.5,8.2],[-5.5,5.5+1.5*sqrt(0.5)],[-3.9+1.5*sqrt(0.5),3.9]]);
}

module show_what(){
    if(part == "20x Extrusion"){
        if(type == "20mm")
            extrusion(sections=0, offset_r=0);
        if(type == "40mm")
            extrusion(sections=1, offset_r=0);
        if(type == "60mm")
            extrusion(sections=2, offset_r=0);
        if(type == "80mm")
            extrusion(sections=3, offset_r=0);
    }
    if(part == "40x40 Extrusion")
        40x40();
    if(part == "Wheel")
        wheel();
    if(part == "OpenRail")
        openrail();
    if(part == "20mm Gantry Plate")
        plate(plate_type=1);
    if(part == "Universal Gantry Plate")
        plate(plate_type=2);
    if(part == "OpenRail Gantry Plate"){
        if(type == "20mm")
            plate(plate_type=3);
        if(type == "40mm")
            plate(plate_type=4);
        if(type == "60mm")
            plate(plate_type=5);
        if(type == "80mm")
            plate(plate_type=6);
    }
    if(part == "20x End Cap"){
        if(type == "20mm")
            end_cap(sections=0, offset_r=tolerance);
        if(type == "40mm")
            end_cap(sections=1, offset_r=tolerance);
        if(type == "60mm")
            end_cap(sections=2, offset_r=tolerance);
        if(type == "80mm")
            end_cap(sections=3, offset_r=tolerance);
    }
    if(part == "T-Nut")
        t_nut();
    if (part == "Flat Linker")
        flat_linker();
    if (part == "Angled Linker")
        angled_linker();
}

color("silver")
scale(scale_factor)
show_what();
